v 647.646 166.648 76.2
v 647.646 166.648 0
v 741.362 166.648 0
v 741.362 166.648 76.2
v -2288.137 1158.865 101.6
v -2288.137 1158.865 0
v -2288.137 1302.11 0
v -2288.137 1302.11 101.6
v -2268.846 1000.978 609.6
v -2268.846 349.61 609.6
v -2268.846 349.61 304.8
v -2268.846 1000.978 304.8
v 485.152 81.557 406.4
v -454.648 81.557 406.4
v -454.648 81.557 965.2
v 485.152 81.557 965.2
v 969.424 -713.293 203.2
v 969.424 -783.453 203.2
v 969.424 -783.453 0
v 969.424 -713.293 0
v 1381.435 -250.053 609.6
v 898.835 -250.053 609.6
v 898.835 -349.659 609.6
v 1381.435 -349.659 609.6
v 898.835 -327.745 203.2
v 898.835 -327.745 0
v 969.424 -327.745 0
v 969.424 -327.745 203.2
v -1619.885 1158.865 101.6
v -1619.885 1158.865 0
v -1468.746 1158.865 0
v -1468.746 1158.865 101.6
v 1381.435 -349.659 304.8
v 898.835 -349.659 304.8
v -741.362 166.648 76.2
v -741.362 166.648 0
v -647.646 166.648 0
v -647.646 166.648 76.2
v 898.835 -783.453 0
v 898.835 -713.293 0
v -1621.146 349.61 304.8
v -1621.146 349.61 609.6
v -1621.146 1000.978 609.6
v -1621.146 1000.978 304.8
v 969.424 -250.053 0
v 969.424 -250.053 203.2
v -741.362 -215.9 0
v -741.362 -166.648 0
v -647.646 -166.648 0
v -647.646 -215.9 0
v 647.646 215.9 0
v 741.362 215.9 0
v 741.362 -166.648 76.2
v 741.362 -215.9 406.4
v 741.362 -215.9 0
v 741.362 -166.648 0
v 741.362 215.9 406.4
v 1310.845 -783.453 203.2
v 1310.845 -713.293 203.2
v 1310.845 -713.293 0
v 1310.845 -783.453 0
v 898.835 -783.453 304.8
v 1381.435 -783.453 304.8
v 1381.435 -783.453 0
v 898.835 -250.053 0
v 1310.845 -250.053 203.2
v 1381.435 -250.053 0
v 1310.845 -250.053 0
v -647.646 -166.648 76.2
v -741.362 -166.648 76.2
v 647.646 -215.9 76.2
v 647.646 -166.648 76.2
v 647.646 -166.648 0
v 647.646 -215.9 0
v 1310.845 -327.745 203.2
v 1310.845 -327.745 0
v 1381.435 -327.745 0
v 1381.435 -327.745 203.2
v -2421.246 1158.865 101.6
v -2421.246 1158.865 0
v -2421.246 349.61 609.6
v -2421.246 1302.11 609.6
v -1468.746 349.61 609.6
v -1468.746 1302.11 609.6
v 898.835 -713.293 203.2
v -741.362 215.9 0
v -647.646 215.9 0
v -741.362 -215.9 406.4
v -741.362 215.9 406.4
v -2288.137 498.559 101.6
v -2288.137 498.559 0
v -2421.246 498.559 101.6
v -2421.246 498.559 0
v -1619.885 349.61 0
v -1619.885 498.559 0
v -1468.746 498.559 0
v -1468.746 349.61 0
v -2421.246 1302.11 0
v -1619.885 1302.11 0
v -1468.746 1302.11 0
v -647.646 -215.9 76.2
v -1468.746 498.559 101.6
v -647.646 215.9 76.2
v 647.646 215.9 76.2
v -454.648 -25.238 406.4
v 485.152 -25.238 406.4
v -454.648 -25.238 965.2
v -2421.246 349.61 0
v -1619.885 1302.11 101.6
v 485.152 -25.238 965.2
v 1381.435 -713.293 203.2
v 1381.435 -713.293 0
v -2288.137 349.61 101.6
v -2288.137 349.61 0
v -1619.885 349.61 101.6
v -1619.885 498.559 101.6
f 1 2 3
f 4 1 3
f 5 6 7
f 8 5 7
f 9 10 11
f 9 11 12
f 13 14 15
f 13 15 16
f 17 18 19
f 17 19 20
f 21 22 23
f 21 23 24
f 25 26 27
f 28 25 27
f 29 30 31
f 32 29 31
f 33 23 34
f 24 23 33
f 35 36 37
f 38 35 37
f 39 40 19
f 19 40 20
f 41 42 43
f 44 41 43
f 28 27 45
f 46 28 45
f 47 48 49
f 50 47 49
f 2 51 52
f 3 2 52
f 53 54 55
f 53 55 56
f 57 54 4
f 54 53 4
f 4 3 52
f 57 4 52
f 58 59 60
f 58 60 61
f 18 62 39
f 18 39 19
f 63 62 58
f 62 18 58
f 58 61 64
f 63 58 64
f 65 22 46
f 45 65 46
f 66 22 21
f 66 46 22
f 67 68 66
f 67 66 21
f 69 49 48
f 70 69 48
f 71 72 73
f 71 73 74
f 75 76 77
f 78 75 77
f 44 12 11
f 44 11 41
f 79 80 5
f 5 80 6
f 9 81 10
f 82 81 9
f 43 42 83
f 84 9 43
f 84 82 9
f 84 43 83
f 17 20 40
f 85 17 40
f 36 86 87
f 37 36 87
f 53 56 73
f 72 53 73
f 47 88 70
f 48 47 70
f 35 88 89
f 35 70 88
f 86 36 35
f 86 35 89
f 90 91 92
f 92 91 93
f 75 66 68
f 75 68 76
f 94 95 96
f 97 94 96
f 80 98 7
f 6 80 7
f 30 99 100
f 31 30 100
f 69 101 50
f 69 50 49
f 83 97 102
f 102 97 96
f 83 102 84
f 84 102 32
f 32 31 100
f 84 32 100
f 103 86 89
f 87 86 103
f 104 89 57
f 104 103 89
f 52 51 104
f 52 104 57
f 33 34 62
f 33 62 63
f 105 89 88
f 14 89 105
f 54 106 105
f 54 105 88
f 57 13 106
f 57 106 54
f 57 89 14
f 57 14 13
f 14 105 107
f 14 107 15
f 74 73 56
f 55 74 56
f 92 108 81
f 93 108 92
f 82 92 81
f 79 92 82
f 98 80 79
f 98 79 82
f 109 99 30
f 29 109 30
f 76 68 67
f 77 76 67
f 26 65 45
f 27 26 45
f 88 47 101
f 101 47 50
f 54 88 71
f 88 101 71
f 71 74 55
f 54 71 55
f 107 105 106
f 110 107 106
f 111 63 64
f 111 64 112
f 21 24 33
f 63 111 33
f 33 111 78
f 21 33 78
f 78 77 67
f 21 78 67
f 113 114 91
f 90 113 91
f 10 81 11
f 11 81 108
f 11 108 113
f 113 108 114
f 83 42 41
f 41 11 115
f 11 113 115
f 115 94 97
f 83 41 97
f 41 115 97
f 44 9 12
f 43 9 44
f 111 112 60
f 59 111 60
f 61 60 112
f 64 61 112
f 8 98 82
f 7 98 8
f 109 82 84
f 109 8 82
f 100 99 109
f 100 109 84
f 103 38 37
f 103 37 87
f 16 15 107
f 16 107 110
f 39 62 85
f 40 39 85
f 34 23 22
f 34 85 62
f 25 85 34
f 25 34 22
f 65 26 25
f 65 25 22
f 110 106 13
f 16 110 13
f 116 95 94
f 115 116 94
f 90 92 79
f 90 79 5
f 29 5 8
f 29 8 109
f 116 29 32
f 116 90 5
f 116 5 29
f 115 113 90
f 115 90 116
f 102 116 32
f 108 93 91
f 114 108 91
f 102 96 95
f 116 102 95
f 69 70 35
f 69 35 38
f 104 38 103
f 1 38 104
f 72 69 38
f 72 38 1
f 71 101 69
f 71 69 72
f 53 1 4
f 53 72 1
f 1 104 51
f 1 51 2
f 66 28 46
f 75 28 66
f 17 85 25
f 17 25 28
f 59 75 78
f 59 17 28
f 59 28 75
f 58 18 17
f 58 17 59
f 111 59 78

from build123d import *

# Parameters (mm, degrees)
F0_W      = 1482.725
F0_H      = 431.8
F1_DEPTH  = 406.4
F3_DEPTH  = 76.2
F4_W      = 482.6
F4_H      = 533.4
F5_DEPTH  = 609.6
F7_DEPTH  = 203.2
F8_W      = 482.6
F8_H      = 433.7946175819
F9_DEPTH  = 304.8
F10_W     = 939.8
F10_H     = 106.794739913
F11_DEPTH = 558.8
F12_W     = 952.5
F12_H     = 952.5
F13_DEPTH = 609.6
F14_W     = 647.7
F14_H     = 651.367831802
F15_DEPTH = 304.8
F17_DEPTH = 101.6


with BuildPart() as f1:
    # F0 (on Top) → F1 (new body)
    with BuildSketch(Plane.XY):
        Rectangle(F0_W, F0_H)
    extrude(amount=F1_DEPTH)

    # F2 (on face) → F3 (cut)
    with BuildSketch(Plane(origin=(0, 0, 0), x_dir=(1, 0, 0), z_dir=(0, 0, -1))):
        Polygon((647.6456522942, 166.6484028101), (647.6456522942, 215.9), (-647.6456522942, 215.9), (-647.6456522942, 166.6484028101), (-741.3625, 166.6484028101), (-741.3625, -166.6484028101), (-647.6456522942, -166.6484028101), (-647.6456522942, -215.9), (647.6456522942, -215.9), (647.6456522942, -166.6484028101), (741.3625, -166.6484028101), (741.3625, 166.6484028101), align=None)
    extrude(amount=-F3_DEPTH, mode=Mode.SUBTRACT)

    # F10 (on face) → F11 (join)
    with BuildSketch(Plane.XY.offset(406.4)):
        with Locations((15.2516663074, 28.1596258283)):
            Rectangle(F10_W, F10_H)
    extrude(amount=F11_DEPTH)


with BuildPart() as f5:
    # F4 (on Top) → F5 (new body)
    with BuildSketch(Plane.XY):
        with Locations((1140.1348749161, -516.7531962161)):
            Rectangle(F4_W, F4_H)
    extrude(amount=F5_DEPTH)

    # F6 (on face) → F7 (cut)
    with BuildSketch(Plane(origin=(0, 0, 0), x_dir=(1, 0, 0), z_dir=(0, 0, -1))):
        Polygon((1310.8453232765, 783.4531962161), (969.4244265556, 783.4531962161), (969.4244265556, 713.2931947708), (898.8348749161, 713.2931947708), (898.8348749161, 327.7447223663), (969.4244265556, 327.7447223663), (969.4244265556, 250.0531962161), (1310.8453232765, 250.0531962161), (1310.8453232765, 327.7447223663), (1381.4348749161, 327.7447223663), (1381.4348749161, 713.2931947708), (1310.8453232765, 713.2931947708), align=None)
    extrude(amount=-F7_DEPTH, mode=Mode.SUBTRACT)

    # F8 (on face) → F9 (cut)
    with BuildSketch(Plane.XY.offset(609.6)):
        with Locations((1140.1348749161, -566.5558874252)):
            Rectangle(F8_W, F8_H)
    extrude(amount=-F9_DEPTH, mode=Mode.SUBTRACT)


with BuildPart() as f13:
    # F12 (on Top) → F13 (new body)
    with BuildSketch(Plane.XY):
        with Locations((-1944.9963480612, 825.8598744869)):
            Rectangle(F12_W, F12_H)
    extrude(amount=F13_DEPTH)

    # F14 (on face) → F15 (cut)
    with BuildSketch(Plane.XY.offset(609.6)):
        with Locations((-1944.9963480612, 675.2937903879)):
            Rectangle(F14_W, F14_H)
    extrude(amount=-F15_DEPTH, mode=Mode.SUBTRACT)

    # F16 (on face) → F17 (cut)
    with BuildSketch(Plane(origin=(0, 0, 0), x_dir=(1, 0, 0), z_dir=(0, 0, -1))):
        Polygon((-1619.8850870132, -349.6098744869), (-2288.1369590759, -349.6098744869), (-2288.1369590759, -498.5591173172), (-2421.2463480612, -498.5591173172), (-2421.2463480612, -1158.8650941849), (-2288.1369590759, -1158.8650941849), (-2288.1369590759, -1302.1098744869), (-1619.8850870132, -1302.1098744869), (-1619.8850870132, -1158.8650941849), (-1468.7463480612, -1158.8650941849), (-1468.7463480612, -498.5591173172), (-1619.8850870132, -498.5591173172), align=None)
    extrude(amount=-F17_DEPTH, mode=Mode.SUBTRACT)


solid = Compound([f1.part, f5.part, f13.part])
